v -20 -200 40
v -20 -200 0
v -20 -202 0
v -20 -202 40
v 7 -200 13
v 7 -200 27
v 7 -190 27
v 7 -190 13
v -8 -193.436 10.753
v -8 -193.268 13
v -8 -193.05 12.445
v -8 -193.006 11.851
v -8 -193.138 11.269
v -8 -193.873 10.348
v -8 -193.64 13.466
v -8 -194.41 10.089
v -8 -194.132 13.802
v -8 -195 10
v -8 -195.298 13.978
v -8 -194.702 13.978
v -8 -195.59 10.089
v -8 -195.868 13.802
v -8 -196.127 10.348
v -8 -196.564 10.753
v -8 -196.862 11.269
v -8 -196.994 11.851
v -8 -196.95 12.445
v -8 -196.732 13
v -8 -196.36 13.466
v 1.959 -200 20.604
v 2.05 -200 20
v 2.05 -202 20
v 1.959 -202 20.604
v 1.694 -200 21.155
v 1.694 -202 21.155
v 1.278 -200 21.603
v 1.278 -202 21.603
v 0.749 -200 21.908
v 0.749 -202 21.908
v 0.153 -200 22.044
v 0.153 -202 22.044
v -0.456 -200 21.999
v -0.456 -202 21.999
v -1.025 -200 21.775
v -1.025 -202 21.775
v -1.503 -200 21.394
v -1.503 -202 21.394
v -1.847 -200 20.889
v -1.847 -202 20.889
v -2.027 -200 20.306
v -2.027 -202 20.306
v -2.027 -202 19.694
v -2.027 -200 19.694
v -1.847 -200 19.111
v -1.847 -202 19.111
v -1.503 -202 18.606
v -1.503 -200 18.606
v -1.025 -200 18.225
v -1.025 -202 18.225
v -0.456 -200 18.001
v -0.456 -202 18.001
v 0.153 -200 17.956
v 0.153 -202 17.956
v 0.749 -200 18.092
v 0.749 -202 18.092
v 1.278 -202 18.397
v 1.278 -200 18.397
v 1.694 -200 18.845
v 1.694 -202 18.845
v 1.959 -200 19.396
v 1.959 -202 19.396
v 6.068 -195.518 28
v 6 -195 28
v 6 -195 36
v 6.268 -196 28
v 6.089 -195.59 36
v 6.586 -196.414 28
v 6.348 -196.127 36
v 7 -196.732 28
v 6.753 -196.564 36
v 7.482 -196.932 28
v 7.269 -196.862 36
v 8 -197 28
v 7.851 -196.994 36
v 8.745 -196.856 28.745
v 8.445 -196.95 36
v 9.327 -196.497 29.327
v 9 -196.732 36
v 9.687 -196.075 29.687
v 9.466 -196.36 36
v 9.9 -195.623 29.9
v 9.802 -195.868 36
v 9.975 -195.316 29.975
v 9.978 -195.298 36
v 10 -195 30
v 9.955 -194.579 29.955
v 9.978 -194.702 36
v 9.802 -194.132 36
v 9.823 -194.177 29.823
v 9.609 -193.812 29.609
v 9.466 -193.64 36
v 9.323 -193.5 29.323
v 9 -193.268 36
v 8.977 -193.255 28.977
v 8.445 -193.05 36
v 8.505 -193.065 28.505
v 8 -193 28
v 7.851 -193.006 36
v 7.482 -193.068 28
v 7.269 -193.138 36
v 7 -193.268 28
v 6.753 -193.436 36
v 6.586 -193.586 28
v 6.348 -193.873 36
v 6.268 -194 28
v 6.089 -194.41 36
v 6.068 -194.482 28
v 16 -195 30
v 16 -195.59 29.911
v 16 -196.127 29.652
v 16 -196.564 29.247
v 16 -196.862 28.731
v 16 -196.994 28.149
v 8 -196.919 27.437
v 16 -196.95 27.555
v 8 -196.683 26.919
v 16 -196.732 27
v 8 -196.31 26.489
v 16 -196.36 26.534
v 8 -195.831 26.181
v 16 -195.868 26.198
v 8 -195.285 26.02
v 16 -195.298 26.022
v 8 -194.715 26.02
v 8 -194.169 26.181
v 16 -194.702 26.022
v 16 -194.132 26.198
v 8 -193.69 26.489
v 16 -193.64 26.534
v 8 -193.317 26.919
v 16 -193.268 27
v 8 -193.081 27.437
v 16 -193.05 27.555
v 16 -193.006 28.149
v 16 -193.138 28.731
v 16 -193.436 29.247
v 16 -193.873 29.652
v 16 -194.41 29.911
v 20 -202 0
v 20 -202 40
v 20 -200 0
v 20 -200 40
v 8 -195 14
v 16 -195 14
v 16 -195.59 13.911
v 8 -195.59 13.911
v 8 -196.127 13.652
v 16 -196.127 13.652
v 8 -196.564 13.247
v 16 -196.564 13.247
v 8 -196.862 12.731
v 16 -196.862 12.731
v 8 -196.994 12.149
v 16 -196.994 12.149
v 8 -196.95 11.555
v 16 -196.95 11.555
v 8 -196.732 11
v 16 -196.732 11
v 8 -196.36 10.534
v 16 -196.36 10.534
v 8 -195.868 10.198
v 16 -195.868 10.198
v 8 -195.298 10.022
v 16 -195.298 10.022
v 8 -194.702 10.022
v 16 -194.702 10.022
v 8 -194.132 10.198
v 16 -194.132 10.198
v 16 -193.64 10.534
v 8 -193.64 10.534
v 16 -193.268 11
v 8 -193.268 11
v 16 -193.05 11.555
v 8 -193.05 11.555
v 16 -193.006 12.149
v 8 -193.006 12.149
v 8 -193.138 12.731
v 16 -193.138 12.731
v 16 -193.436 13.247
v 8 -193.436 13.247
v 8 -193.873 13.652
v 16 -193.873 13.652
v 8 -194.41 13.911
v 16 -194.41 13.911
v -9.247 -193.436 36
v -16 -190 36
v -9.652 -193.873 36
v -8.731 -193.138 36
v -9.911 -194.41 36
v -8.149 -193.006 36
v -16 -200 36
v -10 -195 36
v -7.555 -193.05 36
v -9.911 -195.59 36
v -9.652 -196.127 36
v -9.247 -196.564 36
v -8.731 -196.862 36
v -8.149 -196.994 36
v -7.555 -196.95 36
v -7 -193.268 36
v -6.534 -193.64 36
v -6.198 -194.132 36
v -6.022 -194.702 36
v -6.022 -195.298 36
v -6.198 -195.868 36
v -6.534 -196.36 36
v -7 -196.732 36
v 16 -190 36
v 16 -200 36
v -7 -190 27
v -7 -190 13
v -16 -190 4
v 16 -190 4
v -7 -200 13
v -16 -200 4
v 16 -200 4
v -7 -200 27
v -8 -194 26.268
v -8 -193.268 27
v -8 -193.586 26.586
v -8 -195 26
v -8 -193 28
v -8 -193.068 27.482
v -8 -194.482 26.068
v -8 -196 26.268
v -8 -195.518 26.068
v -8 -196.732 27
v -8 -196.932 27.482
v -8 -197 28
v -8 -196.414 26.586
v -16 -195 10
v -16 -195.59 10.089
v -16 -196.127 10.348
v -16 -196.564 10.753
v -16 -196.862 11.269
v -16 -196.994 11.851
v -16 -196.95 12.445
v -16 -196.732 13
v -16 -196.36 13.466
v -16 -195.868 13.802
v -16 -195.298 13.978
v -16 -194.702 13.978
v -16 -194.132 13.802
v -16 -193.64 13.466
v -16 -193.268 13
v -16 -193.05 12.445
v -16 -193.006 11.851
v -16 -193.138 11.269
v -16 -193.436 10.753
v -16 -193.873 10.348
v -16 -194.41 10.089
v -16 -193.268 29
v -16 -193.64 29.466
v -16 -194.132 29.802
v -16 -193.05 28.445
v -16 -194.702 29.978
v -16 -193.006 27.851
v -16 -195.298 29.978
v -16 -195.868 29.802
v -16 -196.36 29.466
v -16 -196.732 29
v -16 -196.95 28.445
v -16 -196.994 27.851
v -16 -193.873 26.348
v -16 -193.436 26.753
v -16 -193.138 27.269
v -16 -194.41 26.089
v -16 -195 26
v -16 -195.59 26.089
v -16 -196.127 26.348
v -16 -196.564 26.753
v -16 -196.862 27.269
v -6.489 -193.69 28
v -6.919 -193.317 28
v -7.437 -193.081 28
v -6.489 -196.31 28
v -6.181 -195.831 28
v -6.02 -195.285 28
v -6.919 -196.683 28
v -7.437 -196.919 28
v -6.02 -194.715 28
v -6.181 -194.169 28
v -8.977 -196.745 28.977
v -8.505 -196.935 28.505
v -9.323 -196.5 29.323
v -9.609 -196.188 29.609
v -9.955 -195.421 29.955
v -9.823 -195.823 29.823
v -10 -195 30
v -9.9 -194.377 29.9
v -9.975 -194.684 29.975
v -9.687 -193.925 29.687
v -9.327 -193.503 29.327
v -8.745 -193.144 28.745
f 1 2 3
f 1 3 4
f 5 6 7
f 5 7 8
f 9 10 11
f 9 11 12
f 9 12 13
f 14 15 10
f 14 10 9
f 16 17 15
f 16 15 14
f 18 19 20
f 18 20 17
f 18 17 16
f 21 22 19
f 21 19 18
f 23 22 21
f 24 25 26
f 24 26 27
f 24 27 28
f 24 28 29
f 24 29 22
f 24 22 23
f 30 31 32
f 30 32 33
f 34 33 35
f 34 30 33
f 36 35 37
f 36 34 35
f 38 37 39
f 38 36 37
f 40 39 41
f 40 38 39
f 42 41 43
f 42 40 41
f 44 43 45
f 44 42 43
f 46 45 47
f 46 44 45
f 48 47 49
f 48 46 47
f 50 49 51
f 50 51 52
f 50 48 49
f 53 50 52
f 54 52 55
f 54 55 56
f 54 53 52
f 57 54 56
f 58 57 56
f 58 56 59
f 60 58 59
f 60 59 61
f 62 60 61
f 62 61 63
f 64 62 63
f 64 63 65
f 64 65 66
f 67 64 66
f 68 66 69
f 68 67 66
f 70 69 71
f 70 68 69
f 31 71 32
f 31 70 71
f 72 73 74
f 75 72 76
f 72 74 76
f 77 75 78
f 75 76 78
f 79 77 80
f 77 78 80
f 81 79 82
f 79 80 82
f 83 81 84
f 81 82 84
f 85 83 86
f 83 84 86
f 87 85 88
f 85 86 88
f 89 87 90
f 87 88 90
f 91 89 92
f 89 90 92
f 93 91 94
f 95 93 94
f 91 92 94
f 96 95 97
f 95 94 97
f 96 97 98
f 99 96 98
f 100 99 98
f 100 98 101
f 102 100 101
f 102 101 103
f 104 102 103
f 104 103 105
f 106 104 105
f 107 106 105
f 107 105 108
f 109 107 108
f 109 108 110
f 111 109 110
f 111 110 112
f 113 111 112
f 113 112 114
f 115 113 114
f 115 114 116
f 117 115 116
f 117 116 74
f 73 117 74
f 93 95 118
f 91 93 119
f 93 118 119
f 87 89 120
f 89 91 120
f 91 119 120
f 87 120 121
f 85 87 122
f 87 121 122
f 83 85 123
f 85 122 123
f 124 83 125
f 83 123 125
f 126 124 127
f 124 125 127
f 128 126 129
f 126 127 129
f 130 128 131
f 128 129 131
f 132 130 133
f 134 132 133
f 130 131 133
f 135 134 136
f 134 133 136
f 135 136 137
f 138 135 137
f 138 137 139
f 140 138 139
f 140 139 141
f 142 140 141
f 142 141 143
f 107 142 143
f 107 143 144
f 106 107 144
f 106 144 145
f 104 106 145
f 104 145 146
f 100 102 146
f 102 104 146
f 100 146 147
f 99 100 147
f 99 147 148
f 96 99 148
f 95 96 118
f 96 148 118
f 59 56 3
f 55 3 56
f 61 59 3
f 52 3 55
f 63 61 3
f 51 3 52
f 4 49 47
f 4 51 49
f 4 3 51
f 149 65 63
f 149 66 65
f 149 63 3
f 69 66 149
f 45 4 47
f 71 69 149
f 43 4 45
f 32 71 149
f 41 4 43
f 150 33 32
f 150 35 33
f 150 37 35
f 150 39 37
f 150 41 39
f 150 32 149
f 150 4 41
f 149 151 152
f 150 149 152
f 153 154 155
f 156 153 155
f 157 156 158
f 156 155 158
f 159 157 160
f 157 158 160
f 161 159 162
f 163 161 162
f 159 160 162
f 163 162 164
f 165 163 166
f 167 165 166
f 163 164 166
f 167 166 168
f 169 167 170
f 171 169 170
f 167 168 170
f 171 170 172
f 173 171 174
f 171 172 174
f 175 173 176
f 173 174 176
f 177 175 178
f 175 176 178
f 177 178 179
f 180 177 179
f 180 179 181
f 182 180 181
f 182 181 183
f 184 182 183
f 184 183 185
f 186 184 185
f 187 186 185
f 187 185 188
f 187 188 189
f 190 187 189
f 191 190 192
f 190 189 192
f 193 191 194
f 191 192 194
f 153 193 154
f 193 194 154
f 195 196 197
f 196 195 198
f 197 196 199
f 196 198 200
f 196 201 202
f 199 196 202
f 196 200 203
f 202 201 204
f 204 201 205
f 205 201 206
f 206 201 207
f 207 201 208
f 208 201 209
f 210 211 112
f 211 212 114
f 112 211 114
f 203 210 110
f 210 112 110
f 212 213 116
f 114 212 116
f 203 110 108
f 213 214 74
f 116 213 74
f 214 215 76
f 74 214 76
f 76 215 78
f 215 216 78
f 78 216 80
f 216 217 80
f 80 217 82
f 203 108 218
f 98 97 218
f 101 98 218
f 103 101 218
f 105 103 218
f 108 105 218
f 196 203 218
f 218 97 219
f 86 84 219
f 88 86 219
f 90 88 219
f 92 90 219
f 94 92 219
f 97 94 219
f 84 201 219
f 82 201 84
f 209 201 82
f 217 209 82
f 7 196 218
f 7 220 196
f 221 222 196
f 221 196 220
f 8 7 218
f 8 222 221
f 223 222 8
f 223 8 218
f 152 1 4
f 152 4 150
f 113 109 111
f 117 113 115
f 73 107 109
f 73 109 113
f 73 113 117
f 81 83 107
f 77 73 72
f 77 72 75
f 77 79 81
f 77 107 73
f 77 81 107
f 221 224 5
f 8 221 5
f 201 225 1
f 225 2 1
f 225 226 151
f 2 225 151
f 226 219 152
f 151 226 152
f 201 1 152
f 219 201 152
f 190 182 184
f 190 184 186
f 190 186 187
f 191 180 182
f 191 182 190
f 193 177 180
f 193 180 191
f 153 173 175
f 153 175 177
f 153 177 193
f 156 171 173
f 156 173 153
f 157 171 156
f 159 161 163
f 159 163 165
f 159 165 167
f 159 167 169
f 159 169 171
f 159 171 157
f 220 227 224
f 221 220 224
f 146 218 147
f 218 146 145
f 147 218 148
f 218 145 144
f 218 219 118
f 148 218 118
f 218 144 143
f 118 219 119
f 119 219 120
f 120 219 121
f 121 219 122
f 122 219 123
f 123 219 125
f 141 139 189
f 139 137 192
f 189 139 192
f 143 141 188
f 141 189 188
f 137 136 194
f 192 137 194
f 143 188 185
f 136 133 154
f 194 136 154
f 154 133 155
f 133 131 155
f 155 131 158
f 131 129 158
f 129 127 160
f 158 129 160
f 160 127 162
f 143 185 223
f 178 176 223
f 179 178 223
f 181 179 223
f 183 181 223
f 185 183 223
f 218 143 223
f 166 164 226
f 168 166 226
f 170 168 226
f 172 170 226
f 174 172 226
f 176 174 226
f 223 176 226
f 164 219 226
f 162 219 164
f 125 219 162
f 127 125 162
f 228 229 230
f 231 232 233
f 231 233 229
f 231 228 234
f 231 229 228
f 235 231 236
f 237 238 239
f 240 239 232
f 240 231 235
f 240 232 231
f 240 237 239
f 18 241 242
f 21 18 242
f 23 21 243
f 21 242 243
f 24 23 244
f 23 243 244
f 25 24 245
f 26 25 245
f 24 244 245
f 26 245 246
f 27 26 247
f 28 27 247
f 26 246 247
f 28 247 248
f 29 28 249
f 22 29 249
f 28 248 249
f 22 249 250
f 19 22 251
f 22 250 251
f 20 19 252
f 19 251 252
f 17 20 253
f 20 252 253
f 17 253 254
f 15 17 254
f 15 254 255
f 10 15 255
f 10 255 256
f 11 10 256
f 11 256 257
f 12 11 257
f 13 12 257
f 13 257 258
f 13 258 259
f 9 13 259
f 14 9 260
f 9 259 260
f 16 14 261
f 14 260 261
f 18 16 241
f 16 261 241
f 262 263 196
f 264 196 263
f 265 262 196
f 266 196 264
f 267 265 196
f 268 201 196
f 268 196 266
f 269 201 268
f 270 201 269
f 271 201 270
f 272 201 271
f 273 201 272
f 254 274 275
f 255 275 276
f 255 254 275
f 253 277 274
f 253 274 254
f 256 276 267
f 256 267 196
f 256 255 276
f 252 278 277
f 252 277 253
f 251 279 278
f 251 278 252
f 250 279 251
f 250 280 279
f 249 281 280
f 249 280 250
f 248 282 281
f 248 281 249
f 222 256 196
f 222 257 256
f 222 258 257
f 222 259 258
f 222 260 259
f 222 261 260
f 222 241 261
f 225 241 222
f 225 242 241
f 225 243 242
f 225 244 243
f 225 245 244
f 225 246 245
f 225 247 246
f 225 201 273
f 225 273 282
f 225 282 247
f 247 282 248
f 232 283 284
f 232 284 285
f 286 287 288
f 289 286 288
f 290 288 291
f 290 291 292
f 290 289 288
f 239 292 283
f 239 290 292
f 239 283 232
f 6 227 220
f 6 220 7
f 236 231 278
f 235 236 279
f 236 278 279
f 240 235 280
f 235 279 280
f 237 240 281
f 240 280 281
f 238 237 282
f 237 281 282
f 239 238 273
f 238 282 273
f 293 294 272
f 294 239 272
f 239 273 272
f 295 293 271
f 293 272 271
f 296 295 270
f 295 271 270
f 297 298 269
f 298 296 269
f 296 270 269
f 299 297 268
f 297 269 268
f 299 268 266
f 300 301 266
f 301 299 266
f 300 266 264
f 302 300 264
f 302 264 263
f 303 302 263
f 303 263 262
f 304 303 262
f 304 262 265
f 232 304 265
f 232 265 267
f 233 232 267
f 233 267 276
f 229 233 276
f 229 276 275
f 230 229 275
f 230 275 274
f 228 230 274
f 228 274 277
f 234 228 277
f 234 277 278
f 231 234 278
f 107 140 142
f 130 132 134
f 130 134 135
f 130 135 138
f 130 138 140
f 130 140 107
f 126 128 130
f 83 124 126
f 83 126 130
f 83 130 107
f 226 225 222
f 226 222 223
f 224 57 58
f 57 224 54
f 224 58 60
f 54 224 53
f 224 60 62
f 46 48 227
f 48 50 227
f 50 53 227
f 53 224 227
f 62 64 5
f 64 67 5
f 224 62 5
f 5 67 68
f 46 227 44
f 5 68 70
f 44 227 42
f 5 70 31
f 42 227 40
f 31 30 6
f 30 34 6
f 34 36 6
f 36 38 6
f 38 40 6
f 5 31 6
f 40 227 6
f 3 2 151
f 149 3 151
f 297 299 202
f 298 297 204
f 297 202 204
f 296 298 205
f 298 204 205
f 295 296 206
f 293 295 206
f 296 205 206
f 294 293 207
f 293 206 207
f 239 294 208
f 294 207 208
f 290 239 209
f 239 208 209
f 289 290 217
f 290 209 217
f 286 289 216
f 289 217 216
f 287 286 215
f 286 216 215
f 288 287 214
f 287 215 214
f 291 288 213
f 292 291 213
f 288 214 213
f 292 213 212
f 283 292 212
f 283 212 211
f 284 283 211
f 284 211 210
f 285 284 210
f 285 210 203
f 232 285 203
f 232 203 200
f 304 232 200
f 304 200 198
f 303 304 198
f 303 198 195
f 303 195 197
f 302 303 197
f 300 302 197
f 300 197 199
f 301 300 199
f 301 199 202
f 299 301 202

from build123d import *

# Parameters (mm, degrees)
SKETCH003_W     = 40
SKETCH003_H     = 40
SKETCH003_R     = 2.05
PAD003_DEPTH    = 2
SKETCH006_W     = 32
SKETCH006_H     = 32
SKETCH006_W_2   = 14
SKETCH006_H_2   = 14
PAD005_DEPTH    = 10
SKETCH029_R     = 2
POCKET010_DEPTH = 8
SKETCH030_R     = 2
POCKET011_DEPTH = 8
SKETCH031_R     = 2
POCKET012_DEPTH = 8


with BuildPart() as part:
    # Sketch003 → Pad003 (new body)
    with BuildSketch(Plane.XZ):
        with Locations((0, 20)):
            Rectangle(SKETCH003_W, SKETCH003_H)
        with Locations((0, 20)):
            Circle(SKETCH003_R, mode=Mode.SUBTRACT)
    extrude(amount=PAD003_DEPTH)

    # Sketch006 (on Face6 of Pad003) → Pad005 (join)
    with BuildSketch(Plane(origin=(0, 0, 0), x_dir=(1, 0, 0), z_dir=(0, 1, 0))):
        with Locations((0, -20)):
            Rectangle(SKETCH006_W, SKETCH006_H)
        with Locations((0, -20)):
            Rectangle(SKETCH006_W_2, SKETCH006_H_2, mode=Mode.SUBTRACT)
    extrude(amount=PAD005_DEPTH)

    # Sketch029 (on Face8 of Pad005) → Pocket010 (cut)
    with BuildSketch(Plane(origin=(0, 0, 36), x_dir=(-1, 0, 0), z_dir=(0, 0, 1))):
        with Locations((-8, -5)):
            Circle(SKETCH029_R)
        with Locations((8, -5)):
            Circle(SKETCH029_R)
    extrude(amount=-POCKET010_DEPTH, mode=Mode.SUBTRACT)

    # Sketch030 (on Face7 of Pocket010) → Pocket011 (cut)
    with BuildSketch(Plane(origin=(-16, 0, 0), x_dir=(0, 0, -1), z_dir=(-1, 0, 0))):
        with Locations((-28, -5)):
            Circle(SKETCH030_R)
        with Locations((-12, -5)):
            Circle(SKETCH030_R)
    extrude(amount=-POCKET011_DEPTH, mode=Mode.SUBTRACT)

    # Sketch031 (on Face9 of Pocket011) → Pocket012 (cut)
    with BuildSketch(Plane(origin=(16, 0, 0), x_dir=(0, 0, 1), z_dir=(1, 0, 0))):
        with Locations((12, -5)):
            Circle(SKETCH031_R)
        with Locations((28, -5)):
            Circle(SKETCH031_R)
    extrude(amount=-POCKET012_DEPTH, mode=Mode.SUBTRACT)


with BuildPart() as part_1:
    # Body003 placement: moved
    add(part.part.moved(Location((0, -200, 0))))


solid = part_1.part
